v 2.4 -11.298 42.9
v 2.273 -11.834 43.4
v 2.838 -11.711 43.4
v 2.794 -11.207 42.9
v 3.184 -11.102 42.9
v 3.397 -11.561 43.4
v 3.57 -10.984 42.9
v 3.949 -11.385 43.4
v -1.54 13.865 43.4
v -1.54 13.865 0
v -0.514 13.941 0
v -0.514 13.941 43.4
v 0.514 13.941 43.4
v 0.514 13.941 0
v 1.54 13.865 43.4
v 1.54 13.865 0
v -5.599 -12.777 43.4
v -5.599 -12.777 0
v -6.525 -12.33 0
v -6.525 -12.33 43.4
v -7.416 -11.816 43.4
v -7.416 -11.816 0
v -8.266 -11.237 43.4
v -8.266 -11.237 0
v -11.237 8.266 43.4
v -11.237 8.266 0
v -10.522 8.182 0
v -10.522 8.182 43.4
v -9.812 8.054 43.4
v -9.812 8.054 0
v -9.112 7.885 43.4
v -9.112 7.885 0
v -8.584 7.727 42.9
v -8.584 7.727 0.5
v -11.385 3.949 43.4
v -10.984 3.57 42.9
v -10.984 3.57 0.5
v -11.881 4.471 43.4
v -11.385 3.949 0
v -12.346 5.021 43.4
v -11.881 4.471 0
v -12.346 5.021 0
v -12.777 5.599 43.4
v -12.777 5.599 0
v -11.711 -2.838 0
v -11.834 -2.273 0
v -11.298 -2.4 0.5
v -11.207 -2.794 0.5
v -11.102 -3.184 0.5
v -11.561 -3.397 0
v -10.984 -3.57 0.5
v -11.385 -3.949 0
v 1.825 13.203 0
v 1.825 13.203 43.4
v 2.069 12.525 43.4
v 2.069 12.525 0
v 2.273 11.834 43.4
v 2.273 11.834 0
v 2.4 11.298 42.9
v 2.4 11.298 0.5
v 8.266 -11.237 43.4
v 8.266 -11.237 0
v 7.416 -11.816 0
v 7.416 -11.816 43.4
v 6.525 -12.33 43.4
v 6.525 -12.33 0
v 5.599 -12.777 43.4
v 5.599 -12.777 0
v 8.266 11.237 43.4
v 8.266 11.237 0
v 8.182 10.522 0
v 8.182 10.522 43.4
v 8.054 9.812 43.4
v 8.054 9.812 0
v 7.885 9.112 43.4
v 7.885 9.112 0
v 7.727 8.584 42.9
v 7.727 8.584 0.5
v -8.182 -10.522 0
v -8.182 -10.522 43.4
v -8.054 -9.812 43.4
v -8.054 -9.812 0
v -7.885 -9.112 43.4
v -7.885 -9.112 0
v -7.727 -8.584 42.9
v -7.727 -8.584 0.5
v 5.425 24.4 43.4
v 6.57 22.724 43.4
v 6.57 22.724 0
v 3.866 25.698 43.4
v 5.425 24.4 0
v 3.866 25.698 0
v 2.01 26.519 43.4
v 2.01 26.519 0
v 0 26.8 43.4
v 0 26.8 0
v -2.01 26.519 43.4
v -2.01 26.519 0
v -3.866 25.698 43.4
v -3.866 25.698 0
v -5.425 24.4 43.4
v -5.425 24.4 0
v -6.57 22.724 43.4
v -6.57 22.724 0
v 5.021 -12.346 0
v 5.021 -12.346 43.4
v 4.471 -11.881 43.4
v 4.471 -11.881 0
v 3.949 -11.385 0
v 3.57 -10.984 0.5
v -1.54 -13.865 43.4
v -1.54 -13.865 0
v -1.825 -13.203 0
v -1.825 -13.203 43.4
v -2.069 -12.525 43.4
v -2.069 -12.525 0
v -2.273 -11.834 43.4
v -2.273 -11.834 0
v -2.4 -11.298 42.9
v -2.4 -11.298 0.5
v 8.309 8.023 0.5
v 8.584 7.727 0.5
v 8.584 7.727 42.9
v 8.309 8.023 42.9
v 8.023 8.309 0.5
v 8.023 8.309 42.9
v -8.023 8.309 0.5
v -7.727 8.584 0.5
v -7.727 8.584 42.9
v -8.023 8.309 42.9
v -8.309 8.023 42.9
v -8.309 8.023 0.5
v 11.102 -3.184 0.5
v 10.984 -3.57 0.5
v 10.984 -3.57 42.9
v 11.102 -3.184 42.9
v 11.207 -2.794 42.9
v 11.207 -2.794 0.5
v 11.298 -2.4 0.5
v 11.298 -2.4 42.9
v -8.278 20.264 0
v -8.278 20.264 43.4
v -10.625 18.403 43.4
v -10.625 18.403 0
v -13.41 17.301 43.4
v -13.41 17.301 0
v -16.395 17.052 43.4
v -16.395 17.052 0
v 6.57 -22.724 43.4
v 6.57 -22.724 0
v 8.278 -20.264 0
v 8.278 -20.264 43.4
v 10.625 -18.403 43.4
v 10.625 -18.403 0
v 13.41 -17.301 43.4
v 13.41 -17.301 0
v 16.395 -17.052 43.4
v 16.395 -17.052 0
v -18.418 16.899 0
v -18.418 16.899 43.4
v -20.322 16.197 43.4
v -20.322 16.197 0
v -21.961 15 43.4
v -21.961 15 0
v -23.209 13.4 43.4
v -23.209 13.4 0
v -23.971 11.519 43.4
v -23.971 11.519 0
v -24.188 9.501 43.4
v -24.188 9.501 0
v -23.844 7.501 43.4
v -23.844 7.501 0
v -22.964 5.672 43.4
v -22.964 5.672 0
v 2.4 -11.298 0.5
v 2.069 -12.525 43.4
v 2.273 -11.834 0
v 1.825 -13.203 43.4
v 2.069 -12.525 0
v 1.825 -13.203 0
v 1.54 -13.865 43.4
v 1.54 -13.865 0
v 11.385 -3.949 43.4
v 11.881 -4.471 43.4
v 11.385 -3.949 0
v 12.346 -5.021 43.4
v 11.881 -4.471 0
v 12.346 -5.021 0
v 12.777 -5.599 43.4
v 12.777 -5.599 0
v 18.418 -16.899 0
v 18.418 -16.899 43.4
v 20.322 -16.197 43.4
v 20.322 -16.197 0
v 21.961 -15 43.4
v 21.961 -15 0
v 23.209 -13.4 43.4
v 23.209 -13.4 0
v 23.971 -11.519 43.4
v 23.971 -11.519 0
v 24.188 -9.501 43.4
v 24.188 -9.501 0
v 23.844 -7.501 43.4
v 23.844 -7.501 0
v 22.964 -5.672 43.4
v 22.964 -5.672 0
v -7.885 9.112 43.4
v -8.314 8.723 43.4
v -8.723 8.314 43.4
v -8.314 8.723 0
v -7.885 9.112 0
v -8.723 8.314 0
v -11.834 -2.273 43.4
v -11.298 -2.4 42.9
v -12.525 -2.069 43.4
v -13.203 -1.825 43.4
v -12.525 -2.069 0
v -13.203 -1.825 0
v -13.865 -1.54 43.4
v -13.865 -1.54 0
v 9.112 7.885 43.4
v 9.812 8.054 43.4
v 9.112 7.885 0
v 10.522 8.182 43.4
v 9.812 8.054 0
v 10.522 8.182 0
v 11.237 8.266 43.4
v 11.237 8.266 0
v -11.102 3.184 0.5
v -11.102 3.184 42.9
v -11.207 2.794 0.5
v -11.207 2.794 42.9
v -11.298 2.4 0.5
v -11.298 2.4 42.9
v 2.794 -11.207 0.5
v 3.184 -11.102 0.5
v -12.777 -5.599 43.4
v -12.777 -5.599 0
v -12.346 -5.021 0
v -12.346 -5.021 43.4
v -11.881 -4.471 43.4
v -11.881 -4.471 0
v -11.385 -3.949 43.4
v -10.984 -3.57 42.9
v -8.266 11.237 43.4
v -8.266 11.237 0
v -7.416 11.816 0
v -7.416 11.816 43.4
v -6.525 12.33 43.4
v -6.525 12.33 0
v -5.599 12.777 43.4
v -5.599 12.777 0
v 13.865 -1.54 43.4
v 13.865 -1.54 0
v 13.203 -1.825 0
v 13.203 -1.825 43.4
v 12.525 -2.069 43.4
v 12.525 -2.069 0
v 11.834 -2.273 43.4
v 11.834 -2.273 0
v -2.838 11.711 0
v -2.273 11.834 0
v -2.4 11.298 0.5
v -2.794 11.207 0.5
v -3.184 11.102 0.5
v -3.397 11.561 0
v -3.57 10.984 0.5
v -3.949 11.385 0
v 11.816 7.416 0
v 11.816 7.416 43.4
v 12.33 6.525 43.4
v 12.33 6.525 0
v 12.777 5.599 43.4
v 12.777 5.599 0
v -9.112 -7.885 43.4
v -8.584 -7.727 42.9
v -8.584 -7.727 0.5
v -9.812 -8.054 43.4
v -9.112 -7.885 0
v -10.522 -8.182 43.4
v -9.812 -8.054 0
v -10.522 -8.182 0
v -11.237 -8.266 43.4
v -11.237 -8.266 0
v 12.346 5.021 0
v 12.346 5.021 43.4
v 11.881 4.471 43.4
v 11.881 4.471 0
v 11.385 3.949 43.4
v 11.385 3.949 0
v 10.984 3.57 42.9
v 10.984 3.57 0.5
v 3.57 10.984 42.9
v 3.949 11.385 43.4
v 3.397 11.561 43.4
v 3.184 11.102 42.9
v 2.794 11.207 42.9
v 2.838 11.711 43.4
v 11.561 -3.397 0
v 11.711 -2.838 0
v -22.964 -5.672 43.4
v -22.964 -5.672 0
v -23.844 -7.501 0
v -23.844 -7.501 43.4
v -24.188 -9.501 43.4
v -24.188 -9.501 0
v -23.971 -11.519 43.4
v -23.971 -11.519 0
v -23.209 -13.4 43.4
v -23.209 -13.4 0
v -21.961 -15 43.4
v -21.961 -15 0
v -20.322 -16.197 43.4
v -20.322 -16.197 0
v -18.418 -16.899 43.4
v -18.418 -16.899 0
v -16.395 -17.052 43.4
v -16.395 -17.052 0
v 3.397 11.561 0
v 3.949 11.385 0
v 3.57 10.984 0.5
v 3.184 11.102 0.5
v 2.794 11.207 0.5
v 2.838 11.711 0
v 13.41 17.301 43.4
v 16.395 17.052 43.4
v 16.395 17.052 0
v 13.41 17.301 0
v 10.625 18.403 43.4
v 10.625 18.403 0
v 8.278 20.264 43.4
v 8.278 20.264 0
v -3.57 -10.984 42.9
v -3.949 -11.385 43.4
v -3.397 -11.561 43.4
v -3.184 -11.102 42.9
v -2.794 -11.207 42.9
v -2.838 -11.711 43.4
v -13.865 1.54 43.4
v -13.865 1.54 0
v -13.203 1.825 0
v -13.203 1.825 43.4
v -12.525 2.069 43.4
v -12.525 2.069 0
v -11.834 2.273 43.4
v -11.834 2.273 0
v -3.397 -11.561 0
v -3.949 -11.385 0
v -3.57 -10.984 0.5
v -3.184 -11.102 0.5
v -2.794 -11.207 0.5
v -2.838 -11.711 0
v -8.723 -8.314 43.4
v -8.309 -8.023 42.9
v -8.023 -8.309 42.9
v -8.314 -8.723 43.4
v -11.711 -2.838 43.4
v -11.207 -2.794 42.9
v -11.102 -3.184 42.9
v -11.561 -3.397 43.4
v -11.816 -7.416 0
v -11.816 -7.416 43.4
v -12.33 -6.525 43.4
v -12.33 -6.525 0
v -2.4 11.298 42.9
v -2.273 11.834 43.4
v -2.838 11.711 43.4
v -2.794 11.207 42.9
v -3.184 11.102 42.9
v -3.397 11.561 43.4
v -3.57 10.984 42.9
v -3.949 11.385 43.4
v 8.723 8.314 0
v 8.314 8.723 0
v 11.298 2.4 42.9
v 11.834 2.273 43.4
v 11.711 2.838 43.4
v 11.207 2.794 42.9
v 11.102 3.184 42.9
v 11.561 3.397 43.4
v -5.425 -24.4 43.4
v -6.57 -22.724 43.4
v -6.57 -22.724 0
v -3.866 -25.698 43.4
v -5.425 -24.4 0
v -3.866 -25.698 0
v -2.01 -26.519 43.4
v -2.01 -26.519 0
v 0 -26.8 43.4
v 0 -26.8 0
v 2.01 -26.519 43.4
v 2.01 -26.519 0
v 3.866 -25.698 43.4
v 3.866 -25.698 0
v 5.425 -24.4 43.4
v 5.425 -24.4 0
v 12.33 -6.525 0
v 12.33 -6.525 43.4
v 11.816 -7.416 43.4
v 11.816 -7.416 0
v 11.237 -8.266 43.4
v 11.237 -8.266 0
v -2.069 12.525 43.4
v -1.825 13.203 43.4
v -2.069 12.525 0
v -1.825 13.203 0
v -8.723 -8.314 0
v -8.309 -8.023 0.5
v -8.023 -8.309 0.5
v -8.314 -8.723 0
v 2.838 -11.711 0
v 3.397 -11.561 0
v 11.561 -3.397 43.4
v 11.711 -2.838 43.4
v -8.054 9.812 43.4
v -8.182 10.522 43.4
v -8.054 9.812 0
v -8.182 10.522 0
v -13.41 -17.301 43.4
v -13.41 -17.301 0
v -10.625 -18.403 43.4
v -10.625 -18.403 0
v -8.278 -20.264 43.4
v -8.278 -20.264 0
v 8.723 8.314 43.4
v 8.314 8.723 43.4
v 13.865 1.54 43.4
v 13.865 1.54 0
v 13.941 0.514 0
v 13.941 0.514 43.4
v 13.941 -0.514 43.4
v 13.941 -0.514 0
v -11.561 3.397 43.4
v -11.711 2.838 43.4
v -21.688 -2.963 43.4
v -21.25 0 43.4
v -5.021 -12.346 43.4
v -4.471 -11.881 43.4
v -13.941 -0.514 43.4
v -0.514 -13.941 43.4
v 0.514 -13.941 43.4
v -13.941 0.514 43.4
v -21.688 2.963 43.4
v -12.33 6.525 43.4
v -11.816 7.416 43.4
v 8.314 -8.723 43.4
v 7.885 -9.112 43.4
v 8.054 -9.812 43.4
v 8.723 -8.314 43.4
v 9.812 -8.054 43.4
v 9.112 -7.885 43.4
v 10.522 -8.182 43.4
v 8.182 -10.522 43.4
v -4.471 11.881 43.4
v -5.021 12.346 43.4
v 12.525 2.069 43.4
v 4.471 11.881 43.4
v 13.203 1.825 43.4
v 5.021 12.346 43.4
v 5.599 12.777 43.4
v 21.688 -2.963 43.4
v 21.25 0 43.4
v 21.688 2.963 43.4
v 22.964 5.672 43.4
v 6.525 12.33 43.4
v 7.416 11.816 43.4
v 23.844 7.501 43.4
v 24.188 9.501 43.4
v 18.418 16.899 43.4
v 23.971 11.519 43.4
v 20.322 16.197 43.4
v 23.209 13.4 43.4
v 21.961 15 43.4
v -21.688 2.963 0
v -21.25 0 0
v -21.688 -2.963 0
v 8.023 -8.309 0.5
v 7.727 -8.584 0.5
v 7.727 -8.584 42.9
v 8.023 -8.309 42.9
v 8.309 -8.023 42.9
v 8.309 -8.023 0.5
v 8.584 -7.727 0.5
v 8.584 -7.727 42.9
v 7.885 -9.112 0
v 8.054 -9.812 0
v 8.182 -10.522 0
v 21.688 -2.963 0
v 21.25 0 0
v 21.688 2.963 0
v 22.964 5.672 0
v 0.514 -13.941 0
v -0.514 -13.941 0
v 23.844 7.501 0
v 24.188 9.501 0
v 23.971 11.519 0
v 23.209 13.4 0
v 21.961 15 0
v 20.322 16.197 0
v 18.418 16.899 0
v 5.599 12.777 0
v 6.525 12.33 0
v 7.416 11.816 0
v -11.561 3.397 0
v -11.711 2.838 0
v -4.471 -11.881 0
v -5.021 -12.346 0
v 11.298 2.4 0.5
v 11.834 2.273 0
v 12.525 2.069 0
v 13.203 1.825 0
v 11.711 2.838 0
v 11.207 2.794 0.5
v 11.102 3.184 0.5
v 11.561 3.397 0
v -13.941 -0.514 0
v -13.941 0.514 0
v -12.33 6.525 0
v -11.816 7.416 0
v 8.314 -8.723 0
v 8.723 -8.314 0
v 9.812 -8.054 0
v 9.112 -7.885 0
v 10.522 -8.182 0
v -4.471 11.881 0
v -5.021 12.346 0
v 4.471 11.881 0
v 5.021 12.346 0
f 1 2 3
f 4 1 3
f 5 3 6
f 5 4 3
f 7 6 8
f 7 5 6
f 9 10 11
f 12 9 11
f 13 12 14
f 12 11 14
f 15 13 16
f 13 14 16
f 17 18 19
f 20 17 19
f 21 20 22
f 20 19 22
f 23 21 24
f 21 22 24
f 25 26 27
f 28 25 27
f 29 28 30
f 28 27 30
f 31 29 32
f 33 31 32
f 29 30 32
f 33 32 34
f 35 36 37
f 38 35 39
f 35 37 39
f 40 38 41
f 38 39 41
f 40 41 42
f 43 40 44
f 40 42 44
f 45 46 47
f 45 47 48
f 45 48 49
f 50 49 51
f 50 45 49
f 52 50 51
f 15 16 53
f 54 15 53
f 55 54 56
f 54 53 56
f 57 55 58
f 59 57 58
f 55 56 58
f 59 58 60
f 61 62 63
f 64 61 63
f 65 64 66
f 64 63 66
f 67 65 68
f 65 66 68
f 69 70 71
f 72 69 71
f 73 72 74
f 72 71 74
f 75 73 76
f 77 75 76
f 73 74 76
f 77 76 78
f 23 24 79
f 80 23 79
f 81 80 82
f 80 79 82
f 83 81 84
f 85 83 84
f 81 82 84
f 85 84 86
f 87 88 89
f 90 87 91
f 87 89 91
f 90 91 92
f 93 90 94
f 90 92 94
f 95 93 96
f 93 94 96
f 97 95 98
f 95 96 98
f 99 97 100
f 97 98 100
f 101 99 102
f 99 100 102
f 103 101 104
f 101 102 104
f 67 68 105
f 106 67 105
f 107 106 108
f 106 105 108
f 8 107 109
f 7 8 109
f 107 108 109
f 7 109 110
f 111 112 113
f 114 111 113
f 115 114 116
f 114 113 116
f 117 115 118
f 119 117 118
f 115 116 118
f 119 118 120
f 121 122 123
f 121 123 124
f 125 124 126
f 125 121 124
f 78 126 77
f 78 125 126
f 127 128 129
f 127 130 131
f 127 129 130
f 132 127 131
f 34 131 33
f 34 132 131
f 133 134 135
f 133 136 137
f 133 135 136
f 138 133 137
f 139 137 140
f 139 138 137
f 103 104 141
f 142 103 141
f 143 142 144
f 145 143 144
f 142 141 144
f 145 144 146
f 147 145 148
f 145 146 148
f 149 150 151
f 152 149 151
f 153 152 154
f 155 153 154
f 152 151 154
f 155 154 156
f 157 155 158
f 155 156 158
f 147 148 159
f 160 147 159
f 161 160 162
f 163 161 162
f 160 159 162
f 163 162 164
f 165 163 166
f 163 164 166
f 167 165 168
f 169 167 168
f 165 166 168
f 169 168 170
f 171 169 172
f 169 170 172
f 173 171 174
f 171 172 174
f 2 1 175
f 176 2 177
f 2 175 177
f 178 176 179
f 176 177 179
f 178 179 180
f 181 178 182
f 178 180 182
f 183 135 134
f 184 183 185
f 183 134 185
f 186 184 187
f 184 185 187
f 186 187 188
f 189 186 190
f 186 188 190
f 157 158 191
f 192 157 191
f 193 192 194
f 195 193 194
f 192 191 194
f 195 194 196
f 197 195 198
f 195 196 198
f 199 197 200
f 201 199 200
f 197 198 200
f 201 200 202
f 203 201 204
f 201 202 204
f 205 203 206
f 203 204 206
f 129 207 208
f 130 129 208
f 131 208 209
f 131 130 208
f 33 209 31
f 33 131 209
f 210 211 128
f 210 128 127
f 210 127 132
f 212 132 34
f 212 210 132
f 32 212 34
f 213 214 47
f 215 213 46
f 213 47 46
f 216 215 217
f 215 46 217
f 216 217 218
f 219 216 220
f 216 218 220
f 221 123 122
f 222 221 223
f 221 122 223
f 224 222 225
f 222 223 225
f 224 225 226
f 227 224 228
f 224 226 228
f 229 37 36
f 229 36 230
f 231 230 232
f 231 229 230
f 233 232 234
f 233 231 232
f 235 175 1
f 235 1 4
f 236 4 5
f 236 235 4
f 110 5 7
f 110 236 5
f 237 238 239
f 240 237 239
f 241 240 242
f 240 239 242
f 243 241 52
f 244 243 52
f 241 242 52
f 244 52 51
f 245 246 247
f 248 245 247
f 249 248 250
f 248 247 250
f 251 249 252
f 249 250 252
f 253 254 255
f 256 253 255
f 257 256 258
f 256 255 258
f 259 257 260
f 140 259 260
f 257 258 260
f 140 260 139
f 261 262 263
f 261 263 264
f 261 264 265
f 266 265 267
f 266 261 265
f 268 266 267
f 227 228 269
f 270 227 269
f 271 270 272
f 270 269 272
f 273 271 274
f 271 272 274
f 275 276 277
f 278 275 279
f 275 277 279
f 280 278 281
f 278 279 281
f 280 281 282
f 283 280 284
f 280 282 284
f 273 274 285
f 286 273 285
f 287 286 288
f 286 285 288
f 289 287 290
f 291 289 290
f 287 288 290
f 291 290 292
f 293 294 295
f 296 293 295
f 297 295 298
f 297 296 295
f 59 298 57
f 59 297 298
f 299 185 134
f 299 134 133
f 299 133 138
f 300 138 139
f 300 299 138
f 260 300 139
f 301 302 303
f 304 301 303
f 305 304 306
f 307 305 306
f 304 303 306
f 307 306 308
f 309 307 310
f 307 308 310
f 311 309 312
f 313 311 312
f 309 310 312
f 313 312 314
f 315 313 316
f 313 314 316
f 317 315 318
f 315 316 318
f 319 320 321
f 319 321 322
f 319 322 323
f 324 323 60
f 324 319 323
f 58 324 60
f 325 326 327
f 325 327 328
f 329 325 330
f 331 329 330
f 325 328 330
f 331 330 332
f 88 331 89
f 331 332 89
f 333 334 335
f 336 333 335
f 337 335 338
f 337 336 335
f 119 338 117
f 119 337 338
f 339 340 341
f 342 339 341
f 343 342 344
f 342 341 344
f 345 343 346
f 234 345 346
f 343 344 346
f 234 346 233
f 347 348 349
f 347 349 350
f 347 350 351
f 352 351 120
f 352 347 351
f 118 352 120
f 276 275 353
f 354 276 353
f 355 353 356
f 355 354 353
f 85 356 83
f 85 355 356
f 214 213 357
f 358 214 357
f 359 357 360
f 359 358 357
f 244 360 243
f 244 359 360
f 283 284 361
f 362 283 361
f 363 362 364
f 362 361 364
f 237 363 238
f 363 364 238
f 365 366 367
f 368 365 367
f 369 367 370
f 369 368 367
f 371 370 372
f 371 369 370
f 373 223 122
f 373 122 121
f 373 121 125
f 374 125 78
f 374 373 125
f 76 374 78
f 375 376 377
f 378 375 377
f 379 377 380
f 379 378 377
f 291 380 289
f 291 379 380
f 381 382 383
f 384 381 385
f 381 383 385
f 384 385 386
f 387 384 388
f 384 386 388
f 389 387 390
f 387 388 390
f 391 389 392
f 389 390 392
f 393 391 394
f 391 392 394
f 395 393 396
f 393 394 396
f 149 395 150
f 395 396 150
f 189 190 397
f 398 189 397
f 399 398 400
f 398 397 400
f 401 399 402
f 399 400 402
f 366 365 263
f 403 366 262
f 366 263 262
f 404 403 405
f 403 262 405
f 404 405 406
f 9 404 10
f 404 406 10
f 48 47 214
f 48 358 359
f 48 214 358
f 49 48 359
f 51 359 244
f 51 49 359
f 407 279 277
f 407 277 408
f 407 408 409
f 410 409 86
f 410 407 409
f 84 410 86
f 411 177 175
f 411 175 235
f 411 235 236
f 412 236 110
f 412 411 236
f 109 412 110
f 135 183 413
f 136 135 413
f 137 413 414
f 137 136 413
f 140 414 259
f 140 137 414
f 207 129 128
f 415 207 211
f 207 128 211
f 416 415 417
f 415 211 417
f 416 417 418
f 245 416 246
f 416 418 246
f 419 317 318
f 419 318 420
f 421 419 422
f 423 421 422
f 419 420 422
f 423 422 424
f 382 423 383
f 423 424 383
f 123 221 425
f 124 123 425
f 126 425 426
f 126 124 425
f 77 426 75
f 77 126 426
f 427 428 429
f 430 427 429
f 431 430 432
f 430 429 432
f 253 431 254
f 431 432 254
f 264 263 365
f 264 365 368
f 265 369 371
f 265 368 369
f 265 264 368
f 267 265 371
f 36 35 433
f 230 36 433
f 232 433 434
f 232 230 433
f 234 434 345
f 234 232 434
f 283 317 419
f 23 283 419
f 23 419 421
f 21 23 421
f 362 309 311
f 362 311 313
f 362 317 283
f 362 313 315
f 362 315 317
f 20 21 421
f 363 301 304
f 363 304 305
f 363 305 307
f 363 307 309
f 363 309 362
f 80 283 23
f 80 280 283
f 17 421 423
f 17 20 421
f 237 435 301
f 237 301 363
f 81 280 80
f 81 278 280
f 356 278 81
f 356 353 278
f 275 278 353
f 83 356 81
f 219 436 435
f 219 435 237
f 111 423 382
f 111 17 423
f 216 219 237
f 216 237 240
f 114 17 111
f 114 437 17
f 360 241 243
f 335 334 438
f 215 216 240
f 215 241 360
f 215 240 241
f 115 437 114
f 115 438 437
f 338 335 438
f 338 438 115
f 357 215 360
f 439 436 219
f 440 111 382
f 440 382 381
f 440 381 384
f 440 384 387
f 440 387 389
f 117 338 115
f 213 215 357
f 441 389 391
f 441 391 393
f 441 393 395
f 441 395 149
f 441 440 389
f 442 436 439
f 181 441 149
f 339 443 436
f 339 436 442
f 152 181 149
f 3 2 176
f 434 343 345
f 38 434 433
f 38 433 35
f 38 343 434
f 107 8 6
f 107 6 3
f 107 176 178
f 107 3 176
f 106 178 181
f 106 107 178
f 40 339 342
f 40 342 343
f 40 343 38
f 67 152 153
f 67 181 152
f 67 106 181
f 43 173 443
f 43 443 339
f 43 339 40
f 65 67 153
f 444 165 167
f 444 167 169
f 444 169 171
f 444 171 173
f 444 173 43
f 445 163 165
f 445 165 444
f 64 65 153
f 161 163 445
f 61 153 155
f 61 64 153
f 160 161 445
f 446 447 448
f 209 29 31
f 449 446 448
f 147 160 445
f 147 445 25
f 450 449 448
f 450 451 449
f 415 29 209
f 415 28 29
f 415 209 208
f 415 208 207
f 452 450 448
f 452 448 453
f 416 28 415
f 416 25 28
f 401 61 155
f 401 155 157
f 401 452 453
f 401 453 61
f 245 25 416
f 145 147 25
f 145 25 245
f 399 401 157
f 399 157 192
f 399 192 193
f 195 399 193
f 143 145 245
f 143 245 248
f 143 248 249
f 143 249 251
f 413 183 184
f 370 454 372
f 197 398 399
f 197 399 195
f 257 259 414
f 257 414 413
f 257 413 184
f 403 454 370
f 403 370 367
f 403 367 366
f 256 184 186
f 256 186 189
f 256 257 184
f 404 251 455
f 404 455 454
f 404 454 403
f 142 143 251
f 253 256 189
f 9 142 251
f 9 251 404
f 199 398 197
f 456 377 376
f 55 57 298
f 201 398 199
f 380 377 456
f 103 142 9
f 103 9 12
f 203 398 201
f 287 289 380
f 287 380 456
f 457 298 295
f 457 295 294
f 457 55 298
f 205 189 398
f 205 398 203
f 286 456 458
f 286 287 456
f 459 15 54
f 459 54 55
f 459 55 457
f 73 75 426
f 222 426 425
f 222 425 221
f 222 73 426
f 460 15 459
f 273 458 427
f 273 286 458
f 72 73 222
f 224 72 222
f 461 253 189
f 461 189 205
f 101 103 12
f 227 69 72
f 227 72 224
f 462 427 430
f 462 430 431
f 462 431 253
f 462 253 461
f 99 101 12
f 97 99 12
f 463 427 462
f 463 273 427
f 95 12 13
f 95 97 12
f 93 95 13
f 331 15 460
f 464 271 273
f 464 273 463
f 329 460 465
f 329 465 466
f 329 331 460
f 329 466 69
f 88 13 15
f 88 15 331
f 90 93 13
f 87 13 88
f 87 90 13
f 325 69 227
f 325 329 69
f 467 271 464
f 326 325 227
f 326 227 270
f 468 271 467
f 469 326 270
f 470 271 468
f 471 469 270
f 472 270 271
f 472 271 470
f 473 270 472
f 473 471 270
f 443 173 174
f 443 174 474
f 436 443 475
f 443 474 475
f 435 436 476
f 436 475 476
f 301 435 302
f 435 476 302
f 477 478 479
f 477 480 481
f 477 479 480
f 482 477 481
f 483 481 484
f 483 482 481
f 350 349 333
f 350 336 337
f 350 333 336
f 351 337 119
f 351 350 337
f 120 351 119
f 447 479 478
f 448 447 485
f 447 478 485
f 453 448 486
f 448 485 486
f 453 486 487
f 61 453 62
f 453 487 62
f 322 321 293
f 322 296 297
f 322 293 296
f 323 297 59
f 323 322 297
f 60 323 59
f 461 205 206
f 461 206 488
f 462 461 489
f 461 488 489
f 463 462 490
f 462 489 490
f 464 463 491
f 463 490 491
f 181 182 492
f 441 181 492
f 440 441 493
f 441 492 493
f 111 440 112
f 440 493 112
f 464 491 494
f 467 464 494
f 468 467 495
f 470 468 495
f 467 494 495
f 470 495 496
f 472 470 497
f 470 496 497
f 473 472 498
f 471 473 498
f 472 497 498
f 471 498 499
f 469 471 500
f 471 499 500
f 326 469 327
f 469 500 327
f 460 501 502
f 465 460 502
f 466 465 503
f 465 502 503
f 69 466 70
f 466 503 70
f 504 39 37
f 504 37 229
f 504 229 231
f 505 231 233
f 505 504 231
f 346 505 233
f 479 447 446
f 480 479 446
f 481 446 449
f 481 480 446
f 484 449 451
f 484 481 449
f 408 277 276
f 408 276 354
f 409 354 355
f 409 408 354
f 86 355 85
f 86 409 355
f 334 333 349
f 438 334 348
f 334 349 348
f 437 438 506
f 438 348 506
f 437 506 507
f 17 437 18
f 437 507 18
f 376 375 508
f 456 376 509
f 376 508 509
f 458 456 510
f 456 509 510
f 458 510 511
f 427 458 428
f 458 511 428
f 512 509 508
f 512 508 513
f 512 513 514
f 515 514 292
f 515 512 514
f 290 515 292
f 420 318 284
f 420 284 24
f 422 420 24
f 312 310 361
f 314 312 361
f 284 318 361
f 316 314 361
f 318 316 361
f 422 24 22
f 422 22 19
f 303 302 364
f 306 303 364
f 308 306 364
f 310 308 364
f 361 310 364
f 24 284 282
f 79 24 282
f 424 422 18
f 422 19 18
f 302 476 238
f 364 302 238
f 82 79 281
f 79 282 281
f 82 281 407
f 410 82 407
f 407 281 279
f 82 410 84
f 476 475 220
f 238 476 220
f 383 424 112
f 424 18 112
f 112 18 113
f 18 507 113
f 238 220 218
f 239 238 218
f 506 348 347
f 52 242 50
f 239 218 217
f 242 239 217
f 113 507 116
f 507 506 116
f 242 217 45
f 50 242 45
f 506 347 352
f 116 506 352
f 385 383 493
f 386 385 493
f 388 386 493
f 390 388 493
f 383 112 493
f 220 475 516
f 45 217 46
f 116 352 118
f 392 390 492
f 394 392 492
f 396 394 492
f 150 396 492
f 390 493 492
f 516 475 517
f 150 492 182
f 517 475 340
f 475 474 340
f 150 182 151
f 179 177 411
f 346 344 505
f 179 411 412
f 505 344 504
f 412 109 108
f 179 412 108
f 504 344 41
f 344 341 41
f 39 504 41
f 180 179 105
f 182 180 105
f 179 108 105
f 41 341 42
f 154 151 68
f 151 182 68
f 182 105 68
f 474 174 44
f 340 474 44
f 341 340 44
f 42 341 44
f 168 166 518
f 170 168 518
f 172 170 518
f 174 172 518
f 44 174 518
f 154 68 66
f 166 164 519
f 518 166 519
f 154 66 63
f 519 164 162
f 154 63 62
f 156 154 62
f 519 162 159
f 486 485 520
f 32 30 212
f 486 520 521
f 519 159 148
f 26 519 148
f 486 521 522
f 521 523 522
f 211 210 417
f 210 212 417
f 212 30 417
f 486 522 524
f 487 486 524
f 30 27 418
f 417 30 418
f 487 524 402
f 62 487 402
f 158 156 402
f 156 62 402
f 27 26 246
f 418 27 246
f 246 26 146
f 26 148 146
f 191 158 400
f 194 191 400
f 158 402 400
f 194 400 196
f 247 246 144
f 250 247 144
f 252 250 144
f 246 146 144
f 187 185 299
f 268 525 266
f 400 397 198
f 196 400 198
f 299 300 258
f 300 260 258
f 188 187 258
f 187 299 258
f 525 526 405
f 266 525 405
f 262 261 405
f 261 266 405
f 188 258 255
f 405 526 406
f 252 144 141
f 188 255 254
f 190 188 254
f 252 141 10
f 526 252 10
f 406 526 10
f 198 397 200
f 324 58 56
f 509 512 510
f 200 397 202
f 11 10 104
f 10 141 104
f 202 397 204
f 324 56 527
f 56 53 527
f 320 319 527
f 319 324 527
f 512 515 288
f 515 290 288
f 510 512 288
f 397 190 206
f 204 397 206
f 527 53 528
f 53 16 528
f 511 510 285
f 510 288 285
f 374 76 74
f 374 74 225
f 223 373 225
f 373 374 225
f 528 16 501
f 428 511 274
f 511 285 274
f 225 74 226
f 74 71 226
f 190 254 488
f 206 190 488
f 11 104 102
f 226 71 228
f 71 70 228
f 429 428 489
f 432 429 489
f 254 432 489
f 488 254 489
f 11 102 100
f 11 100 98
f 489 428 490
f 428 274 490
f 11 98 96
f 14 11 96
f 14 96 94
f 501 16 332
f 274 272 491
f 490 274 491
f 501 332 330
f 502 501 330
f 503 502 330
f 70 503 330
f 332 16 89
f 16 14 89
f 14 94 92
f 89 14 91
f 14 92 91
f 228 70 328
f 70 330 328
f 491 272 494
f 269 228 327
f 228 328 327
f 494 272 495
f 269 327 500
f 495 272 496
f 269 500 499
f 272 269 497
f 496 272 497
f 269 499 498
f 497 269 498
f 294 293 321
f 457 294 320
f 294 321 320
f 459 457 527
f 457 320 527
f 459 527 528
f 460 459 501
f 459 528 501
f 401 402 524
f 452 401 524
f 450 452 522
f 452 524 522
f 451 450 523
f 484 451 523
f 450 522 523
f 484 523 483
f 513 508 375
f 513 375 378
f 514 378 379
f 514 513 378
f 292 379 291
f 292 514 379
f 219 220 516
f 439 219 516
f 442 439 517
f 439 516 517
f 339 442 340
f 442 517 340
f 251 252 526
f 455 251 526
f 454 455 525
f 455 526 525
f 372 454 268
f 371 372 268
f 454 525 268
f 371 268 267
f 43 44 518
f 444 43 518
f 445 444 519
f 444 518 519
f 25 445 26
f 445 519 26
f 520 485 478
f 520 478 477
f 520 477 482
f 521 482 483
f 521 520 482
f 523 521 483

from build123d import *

# Parameters (mm, degrees)
SKETCH1_R         = 11.5
EXTRUDE1_DEPTH    = 43.4
EXTRUDE2_REACH    = 58.454
CIRPATTERN1_COUNT = 12


with BuildPart() as part:
    # Sketch1 → Extrude1 (new body)
    with BuildSketch(Plane.XY):
        with BuildLine():
            ThreePointArc((6.569682115, 22.724006281), (0, 26.8), (-6.569682115, 22.724006281))
            ThreePointArc((-6.569682115, 22.724006281), (-10.625, 18.40303983), (-16.394725658, 17.051514747))
            ThreePointArc((-16.394725658, 17.051514747), (-23.209480821, 13.4), (-22.964407773, 5.672491534))
            ThreePointArc((-22.964407773, 5.672491534), (-21.25, 0), (-22.964407773, -5.672491534))
            ThreePointArc((-22.964407773, -5.672491534), (-23.209480821, -13.4), (-16.394725658, -17.051514747))
            ThreePointArc((-16.394725658, -17.051514747), (-10.625, -18.40303983), (-6.569682115, -22.724006281))
            ThreePointArc((-6.569682115, -22.724006281), (0, -26.8), (6.569682115, -22.724006281))
            ThreePointArc((6.569682115, -22.724006281), (10.625, -18.40303983), (16.394725658, -17.051514747))
            ThreePointArc((16.394725658, -17.051514747), (23.209480821, -13.4), (22.964407773, -5.672491534))
            ThreePointArc((22.964407773, -5.672491534), (21.25, 0), (22.964407773, 5.672491534))
            ThreePointArc((22.964407773, 5.672491534), (23.209480821, 13.4), (16.394725658, 17.051514747))
            ThreePointArc((16.394725658, 17.051514747), (10.625, 18.40303983), (6.569682115, 22.724006281))
        make_face()
        Circle(SKETCH1_R, mode=Mode.SUBTRACT)
    extrude(amount=EXTRUDE1_DEPTH)

    # Sketch4 → Cut-Revolve1 (revolve, cut)
    with BuildSketch(Plane(origin=(0, 0, 0), x_dir=(0, 0, -1), z_dir=(1, 0, 0)), mode=Mode.PRIVATE) as cut_revolve1_sk:
        Polygon((0, 0), (-43.4, 0), (-43.4, 12.05), (-42.9, 11.55), (-0.5, 11.55), (0, 12.05), align=None)
    revolve(cut_revolve1_sk.sketch.rotate(Axis((0, 0, 0), (0, 0, 1)), 90), axis=Axis((0, 0, 0), (0, 0, 1)), mode=Mode.SUBTRACT)

    # Sketch2 → Extrude2 (cut, up to next)
    with BuildSketch(Plane(origin=(0, 0, 0), x_dir=(-1, 0, 0), z_dir=(0, 0, -1)), mode=Mode.PRIVATE) as extrude2_sk1:
        with BuildLine():
            ThreePointArc((1.54, 13.864735843), (0, 13.95), (-1.54, 13.864735843))
            ThreePointArc((-1.54, 13.864735843), (-2.042378597, 12.605566852), (-2.4, 11.297898035))
            ThreePointArc((-2.4, 11.297898035), (0, 11.55), (2.4, 11.297898035))
            ThreePointArc((2.4, 11.297898035), (2.042378597, 12.605566852), (1.54, 13.864735843))
        make_face()
    extrude2_tool1 = extrude(extrude2_sk1.sketch, amount=-EXTRUDE2_REACH, mode=Mode.PRIVATE) & part.part
    extrude2 = extrude2_tool1.solids().sort_by_distance((0, 12.606446, 0))[0]
    add(extrude2, mode=Mode.SUBTRACT)

    # CirPattern1: Extrude2 ×12 about axis
    cirpattern1_axis = Axis((0, 0, 0), (0, 0, 1))
    for i in range(1, CIRPATTERN1_COUNT):
        add(extrude2.rotate(cirpattern1_axis, i * 360 / CIRPATTERN1_COUNT), mode=Mode.SUBTRACT)


solid = part.part
